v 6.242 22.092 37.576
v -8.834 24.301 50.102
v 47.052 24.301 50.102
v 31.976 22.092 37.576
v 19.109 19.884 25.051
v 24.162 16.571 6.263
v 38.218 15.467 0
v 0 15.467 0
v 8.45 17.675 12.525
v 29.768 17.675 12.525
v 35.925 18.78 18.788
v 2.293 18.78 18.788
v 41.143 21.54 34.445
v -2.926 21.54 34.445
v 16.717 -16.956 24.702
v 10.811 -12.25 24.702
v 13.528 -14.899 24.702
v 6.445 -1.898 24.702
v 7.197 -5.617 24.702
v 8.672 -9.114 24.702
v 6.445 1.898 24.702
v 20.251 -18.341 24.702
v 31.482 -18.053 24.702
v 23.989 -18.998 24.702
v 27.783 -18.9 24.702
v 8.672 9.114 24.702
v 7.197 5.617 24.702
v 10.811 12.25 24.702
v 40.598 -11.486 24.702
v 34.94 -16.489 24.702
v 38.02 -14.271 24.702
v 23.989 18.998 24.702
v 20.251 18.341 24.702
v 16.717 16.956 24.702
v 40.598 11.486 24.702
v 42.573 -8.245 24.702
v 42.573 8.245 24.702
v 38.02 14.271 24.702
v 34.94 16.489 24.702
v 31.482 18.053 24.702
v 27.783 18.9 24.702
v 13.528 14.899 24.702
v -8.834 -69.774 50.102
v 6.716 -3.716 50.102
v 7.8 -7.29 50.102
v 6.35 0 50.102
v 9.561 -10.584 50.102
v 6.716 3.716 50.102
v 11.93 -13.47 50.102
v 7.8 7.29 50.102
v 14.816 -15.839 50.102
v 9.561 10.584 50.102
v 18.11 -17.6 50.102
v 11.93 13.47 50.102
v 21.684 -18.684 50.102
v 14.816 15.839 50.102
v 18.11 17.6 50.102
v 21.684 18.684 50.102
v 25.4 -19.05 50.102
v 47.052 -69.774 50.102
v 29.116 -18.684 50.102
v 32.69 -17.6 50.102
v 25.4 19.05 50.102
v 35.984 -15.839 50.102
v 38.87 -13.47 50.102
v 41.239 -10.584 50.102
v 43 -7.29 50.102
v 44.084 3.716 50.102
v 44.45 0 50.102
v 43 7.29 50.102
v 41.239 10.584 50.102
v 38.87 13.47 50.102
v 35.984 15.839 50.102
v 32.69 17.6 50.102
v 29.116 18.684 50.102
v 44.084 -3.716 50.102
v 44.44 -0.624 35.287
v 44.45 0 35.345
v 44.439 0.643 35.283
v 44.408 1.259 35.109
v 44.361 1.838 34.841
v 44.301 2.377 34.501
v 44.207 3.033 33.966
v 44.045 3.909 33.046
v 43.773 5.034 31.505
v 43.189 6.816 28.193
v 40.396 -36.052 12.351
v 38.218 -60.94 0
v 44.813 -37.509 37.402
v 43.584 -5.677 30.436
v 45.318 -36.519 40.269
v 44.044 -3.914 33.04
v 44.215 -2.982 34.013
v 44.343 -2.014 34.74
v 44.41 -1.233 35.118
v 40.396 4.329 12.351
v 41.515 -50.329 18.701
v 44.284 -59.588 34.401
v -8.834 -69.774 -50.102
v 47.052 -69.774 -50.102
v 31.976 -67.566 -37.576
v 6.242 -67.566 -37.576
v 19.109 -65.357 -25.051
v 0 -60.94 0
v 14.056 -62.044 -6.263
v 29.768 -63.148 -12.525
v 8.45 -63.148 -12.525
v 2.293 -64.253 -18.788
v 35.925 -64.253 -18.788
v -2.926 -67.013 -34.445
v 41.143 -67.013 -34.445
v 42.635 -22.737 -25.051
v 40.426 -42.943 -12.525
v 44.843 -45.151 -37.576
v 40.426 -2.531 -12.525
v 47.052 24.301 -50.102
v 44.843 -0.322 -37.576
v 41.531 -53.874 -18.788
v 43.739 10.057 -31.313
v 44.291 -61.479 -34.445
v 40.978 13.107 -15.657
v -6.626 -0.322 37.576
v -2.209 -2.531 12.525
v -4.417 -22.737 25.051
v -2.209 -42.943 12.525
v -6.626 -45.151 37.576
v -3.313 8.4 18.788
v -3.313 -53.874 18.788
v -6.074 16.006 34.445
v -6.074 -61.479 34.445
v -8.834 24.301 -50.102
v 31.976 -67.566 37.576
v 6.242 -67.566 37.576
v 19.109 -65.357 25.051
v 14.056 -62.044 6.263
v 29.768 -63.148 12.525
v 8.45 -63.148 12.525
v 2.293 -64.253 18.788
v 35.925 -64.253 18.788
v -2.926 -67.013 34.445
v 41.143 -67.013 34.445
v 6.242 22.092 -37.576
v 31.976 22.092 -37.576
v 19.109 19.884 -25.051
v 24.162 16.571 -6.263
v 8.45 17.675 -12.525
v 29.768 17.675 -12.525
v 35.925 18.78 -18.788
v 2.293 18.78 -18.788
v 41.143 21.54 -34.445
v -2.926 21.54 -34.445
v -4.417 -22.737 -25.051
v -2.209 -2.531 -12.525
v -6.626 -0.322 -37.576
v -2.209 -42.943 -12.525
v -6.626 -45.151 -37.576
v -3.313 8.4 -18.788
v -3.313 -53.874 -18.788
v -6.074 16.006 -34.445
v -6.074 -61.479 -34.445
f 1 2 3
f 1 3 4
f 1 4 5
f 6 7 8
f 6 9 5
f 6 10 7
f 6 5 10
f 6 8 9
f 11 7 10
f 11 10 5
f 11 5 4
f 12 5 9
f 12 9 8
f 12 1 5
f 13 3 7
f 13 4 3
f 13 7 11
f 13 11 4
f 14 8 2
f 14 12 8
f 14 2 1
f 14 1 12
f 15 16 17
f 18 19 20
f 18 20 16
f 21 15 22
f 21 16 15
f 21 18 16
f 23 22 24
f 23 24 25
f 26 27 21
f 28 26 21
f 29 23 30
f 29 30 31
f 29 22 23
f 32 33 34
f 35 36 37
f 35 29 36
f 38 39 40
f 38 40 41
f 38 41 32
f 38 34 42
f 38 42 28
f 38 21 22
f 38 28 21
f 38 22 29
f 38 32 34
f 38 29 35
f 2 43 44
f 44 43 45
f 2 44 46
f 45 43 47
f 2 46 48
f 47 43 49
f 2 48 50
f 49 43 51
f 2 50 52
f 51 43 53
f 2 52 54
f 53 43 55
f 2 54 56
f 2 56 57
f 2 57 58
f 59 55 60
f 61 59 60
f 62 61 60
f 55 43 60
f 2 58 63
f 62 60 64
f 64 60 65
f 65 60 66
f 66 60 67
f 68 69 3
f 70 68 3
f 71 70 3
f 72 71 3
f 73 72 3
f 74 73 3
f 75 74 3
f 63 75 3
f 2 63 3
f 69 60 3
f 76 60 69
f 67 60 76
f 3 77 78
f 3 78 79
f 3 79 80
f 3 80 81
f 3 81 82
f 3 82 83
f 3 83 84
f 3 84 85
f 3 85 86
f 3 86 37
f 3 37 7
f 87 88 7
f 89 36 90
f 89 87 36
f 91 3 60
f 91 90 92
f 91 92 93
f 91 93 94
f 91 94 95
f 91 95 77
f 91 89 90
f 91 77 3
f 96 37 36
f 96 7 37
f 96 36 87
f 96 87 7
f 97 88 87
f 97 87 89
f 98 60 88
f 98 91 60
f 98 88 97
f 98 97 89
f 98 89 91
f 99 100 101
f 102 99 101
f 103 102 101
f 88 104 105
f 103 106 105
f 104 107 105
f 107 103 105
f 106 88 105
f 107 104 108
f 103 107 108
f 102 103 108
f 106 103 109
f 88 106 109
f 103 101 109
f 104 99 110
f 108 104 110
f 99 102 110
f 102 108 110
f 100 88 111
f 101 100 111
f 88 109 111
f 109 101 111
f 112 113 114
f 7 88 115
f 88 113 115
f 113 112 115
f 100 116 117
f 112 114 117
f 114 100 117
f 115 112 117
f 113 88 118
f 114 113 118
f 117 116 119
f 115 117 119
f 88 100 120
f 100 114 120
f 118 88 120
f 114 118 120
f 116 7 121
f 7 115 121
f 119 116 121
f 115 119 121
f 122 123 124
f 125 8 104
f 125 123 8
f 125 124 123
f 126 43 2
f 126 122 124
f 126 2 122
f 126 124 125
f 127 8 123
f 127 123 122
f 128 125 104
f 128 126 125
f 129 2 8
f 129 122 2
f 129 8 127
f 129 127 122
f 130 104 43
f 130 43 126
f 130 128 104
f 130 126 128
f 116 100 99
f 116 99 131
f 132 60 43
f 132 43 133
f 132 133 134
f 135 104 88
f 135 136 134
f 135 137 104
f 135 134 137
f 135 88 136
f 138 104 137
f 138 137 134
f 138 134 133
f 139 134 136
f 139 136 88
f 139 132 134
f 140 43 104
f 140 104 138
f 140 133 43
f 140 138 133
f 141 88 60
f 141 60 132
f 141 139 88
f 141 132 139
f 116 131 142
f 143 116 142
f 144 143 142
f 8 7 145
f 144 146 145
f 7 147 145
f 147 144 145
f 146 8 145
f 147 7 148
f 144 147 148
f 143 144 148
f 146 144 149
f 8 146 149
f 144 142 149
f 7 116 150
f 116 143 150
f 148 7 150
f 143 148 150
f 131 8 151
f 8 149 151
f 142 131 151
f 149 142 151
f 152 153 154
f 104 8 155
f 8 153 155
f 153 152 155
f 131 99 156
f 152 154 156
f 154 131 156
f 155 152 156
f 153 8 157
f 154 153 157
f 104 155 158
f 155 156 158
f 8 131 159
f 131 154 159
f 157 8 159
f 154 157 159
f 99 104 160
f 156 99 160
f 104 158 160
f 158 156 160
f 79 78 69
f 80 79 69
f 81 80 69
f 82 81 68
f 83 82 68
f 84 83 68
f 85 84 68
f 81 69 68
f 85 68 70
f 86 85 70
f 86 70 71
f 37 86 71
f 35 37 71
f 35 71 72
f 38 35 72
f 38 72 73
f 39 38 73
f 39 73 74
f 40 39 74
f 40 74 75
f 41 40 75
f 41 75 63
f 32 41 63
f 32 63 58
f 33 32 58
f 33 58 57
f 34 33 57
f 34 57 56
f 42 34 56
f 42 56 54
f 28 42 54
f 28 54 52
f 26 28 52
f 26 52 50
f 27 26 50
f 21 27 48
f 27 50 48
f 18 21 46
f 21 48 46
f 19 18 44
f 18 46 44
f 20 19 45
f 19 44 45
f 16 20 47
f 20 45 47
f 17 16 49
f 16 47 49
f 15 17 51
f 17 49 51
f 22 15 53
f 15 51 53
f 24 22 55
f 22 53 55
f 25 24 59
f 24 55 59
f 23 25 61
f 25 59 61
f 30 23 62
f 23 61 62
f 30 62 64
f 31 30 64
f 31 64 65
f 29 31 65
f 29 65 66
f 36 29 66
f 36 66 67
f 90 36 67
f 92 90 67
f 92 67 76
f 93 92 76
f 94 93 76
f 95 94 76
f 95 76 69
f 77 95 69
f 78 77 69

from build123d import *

# Parameters (mm, degrees)
F0_W     = 38.2177424617
F0_H     = 76.4065049589
F1_DEPTH = 50.1015456393
F1_TAPER = -10
F2_R     = 19.05
F3_DEPTH = 25.4


with BuildPart() as f1:
    # F0 (on Top) → F1 (new body, symmetric)
    with BuildSketch(Plane.XY):
        with Locations((19.1088712309, -22.7365922183)):
            Rectangle(F0_W, F0_H)
    extrude(amount=F1_DEPTH, both=True, taper=F1_TAPER)

    # F2 (on face) → F3 (cut)
    with BuildSketch(Plane.XY.offset(50.1015456393)):
        with Locations((25.4, 0)):
            Circle(F2_R)
    extrude(amount=-F3_DEPTH, mode=Mode.SUBTRACT)


solid = f1.part
